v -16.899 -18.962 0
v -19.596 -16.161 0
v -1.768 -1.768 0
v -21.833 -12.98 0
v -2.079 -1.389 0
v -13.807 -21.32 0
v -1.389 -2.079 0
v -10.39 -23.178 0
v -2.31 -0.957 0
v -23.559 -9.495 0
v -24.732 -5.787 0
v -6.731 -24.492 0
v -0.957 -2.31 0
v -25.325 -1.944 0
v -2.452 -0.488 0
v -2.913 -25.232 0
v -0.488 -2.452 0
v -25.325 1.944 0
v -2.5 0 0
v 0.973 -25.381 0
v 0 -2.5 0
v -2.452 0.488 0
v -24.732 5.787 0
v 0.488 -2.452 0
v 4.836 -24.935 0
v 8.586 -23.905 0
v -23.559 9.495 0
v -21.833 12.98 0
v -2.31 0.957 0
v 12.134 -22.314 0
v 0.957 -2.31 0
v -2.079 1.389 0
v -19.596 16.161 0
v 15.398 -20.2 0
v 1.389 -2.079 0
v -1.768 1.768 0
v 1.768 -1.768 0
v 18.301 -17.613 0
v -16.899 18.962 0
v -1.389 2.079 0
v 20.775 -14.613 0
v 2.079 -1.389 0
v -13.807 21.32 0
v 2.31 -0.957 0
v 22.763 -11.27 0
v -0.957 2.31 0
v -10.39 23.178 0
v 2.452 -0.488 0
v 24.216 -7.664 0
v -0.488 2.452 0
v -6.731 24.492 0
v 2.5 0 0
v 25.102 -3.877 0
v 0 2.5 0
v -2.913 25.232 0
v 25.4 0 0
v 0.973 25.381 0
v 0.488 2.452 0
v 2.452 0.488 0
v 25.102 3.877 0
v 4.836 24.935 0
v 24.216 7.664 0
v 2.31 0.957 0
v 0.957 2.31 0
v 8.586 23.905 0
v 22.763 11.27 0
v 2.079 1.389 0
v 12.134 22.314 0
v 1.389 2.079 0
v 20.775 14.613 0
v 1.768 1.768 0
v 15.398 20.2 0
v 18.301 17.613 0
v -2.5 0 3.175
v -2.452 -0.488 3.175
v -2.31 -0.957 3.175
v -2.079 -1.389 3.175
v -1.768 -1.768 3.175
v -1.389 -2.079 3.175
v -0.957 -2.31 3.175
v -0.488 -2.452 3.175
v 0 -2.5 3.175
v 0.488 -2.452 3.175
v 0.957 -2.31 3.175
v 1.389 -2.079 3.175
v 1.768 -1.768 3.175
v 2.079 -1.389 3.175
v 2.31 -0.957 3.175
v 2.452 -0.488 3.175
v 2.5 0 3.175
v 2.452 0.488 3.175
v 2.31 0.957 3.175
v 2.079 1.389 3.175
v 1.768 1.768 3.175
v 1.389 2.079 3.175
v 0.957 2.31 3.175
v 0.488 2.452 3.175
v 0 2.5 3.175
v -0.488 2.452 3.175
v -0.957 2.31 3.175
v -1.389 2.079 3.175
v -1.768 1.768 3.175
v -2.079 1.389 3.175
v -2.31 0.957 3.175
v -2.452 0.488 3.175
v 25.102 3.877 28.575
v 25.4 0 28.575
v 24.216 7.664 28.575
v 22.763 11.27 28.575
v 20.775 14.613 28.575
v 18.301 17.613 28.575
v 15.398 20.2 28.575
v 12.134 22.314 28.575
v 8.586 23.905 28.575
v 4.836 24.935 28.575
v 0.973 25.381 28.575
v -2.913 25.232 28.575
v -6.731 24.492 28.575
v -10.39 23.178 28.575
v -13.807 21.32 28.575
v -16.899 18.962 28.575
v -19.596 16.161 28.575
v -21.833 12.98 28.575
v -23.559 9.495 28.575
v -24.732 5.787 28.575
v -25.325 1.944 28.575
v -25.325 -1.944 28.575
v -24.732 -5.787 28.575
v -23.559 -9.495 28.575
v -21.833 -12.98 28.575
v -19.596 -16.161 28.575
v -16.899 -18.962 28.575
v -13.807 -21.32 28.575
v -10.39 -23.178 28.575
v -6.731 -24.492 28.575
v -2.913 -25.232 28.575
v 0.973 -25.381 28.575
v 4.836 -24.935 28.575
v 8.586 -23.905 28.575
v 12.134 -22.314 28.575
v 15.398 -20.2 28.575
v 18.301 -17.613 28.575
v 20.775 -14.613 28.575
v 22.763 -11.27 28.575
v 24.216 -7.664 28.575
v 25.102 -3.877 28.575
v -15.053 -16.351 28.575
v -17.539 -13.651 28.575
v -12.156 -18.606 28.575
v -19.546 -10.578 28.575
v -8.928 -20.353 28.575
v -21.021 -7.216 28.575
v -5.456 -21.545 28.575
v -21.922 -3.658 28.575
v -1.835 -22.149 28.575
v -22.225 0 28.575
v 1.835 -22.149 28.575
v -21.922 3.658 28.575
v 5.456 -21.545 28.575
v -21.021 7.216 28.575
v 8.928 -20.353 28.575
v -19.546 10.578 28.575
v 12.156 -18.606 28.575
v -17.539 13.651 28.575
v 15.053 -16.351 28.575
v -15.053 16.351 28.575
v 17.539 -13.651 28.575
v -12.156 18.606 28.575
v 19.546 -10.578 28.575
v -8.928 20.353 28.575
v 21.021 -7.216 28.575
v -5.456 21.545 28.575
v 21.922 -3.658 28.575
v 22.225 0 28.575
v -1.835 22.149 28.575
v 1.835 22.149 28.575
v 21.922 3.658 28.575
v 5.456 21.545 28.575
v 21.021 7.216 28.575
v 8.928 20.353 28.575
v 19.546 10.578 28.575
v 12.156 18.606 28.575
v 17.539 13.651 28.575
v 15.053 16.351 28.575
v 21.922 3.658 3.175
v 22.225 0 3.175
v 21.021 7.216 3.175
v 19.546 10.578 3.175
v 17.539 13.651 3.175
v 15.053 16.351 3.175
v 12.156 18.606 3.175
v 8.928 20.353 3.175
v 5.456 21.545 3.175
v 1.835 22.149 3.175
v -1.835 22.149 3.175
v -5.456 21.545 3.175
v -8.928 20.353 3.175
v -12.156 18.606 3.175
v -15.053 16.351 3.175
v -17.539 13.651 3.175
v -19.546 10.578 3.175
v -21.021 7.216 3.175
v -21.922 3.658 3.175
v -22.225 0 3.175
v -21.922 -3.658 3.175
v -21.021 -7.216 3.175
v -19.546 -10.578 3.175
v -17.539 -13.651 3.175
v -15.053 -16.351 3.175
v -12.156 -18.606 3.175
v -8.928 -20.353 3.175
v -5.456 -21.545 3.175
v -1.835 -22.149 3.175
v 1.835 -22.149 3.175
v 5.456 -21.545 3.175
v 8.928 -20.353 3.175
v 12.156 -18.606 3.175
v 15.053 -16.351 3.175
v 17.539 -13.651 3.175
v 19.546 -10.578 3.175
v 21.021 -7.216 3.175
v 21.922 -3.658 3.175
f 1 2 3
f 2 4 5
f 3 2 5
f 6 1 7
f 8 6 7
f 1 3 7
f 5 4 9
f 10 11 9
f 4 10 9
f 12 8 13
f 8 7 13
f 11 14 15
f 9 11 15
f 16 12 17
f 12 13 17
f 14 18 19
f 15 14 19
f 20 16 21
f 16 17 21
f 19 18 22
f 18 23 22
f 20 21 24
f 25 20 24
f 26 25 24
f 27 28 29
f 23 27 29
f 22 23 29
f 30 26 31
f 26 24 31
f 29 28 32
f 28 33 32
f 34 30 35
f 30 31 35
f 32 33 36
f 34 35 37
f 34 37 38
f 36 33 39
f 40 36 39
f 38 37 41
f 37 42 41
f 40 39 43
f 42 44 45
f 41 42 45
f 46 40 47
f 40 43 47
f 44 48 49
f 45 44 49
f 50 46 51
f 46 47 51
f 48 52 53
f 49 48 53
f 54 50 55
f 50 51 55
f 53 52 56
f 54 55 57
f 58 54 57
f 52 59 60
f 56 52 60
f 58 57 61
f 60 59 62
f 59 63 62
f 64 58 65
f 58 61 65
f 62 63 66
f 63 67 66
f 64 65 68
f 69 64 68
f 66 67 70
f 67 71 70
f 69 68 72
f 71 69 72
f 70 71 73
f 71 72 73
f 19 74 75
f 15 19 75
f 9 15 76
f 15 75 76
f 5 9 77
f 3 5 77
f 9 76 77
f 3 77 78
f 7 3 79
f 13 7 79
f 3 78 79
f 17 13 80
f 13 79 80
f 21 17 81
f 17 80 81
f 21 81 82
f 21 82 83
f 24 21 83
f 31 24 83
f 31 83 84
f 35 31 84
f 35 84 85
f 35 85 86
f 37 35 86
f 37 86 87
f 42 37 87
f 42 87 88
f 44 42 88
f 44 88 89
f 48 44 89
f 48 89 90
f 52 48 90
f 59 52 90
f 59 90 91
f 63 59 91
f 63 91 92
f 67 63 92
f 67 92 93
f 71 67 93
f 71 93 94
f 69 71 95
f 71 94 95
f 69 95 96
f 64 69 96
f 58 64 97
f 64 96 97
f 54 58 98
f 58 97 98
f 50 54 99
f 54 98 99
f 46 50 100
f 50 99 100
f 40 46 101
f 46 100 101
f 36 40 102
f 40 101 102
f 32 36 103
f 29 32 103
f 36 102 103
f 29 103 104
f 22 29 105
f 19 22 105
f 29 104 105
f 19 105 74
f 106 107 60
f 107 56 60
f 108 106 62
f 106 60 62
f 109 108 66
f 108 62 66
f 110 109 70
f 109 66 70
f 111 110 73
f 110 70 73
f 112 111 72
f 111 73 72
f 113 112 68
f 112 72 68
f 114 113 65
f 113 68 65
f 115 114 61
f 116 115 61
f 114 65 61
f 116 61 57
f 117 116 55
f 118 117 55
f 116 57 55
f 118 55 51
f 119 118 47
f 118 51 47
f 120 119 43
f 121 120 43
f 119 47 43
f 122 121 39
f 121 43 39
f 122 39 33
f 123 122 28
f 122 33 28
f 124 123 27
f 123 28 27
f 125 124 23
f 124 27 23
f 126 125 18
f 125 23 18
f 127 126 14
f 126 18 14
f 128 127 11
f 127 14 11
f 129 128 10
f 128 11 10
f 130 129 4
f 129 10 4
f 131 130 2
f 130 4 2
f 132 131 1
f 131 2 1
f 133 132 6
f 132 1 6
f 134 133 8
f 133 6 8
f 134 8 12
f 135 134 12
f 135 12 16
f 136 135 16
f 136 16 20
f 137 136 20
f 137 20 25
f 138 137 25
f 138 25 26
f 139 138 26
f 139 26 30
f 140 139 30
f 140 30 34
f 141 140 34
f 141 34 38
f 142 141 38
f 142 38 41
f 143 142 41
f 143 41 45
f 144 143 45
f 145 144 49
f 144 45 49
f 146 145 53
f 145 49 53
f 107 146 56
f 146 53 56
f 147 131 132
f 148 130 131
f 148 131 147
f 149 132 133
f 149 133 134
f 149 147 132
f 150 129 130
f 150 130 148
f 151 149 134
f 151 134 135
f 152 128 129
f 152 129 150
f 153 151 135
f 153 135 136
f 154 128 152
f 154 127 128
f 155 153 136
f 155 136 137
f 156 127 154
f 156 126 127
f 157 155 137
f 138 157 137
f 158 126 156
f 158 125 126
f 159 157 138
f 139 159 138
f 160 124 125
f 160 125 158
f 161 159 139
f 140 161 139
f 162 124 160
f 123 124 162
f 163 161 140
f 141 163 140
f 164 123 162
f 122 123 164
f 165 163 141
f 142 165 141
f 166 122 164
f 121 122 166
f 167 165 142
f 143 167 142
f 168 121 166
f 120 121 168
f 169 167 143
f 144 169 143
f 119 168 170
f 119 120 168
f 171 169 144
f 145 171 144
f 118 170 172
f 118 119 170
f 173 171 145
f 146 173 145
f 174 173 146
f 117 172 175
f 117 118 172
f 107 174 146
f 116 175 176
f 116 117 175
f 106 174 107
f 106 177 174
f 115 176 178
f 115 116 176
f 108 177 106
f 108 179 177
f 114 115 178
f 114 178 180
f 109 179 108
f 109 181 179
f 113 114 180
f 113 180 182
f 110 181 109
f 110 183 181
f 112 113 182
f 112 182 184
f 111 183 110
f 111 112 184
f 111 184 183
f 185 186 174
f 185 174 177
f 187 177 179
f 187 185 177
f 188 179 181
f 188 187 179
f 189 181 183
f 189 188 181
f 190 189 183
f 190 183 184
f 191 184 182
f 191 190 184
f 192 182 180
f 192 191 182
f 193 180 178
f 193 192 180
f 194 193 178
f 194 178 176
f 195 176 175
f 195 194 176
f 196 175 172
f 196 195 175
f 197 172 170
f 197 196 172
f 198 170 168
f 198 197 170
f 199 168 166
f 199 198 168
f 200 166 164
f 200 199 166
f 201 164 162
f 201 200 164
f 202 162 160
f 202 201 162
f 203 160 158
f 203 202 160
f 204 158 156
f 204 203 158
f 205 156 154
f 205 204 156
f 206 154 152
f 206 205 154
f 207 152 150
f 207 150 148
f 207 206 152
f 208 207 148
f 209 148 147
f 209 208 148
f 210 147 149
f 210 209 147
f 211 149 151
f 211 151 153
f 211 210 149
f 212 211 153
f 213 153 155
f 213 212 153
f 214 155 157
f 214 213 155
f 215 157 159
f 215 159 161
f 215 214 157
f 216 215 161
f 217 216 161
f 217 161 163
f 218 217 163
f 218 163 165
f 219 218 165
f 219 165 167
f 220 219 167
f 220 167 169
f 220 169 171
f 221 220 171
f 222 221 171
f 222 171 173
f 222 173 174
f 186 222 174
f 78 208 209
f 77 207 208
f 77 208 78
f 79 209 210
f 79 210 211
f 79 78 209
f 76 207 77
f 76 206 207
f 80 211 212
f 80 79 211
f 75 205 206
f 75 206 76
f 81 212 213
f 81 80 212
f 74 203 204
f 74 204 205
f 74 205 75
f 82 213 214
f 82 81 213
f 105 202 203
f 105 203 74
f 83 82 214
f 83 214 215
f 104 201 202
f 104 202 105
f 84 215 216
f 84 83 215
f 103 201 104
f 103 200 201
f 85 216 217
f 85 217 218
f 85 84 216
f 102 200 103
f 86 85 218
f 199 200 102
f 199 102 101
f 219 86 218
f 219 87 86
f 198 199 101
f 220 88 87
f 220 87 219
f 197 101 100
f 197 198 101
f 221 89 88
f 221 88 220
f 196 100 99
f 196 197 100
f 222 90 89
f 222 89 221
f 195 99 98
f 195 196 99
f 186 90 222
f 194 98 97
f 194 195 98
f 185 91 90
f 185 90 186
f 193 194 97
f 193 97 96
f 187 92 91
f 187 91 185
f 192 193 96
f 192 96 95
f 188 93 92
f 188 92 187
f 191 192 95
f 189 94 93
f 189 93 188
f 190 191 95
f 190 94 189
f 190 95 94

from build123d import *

# Parameters (mm, degrees)
F0_R     = 25.4
F1_DEPTH = 3.175
F2_R     = 25.4
F2_R_2   = 22.225
F3_DEPTH = 25.4
F4_D     = 5


with BuildPart() as f1:
    # F0 (on Top) → F1 (new body)
    with BuildSketch(Plane.XY):
        Circle(F0_R)
    extrude(amount=F1_DEPTH)

    # F2 (on face) → F3 (join)
    with BuildSketch(Plane.XY.offset(3.175)):
        Circle(F2_R)
        Circle(F2_R_2, mode=Mode.SUBTRACT)
    extrude(amount=F3_DEPTH)

    # F4 (through all)
    with Locations(Plane(origin=(0, 0, 0), x_dir=(1, 0, 0), z_dir=(0, 0, -1))):
        with Locations((0, 0)):
            Hole(F4_D / 2)


solid = f1.part
